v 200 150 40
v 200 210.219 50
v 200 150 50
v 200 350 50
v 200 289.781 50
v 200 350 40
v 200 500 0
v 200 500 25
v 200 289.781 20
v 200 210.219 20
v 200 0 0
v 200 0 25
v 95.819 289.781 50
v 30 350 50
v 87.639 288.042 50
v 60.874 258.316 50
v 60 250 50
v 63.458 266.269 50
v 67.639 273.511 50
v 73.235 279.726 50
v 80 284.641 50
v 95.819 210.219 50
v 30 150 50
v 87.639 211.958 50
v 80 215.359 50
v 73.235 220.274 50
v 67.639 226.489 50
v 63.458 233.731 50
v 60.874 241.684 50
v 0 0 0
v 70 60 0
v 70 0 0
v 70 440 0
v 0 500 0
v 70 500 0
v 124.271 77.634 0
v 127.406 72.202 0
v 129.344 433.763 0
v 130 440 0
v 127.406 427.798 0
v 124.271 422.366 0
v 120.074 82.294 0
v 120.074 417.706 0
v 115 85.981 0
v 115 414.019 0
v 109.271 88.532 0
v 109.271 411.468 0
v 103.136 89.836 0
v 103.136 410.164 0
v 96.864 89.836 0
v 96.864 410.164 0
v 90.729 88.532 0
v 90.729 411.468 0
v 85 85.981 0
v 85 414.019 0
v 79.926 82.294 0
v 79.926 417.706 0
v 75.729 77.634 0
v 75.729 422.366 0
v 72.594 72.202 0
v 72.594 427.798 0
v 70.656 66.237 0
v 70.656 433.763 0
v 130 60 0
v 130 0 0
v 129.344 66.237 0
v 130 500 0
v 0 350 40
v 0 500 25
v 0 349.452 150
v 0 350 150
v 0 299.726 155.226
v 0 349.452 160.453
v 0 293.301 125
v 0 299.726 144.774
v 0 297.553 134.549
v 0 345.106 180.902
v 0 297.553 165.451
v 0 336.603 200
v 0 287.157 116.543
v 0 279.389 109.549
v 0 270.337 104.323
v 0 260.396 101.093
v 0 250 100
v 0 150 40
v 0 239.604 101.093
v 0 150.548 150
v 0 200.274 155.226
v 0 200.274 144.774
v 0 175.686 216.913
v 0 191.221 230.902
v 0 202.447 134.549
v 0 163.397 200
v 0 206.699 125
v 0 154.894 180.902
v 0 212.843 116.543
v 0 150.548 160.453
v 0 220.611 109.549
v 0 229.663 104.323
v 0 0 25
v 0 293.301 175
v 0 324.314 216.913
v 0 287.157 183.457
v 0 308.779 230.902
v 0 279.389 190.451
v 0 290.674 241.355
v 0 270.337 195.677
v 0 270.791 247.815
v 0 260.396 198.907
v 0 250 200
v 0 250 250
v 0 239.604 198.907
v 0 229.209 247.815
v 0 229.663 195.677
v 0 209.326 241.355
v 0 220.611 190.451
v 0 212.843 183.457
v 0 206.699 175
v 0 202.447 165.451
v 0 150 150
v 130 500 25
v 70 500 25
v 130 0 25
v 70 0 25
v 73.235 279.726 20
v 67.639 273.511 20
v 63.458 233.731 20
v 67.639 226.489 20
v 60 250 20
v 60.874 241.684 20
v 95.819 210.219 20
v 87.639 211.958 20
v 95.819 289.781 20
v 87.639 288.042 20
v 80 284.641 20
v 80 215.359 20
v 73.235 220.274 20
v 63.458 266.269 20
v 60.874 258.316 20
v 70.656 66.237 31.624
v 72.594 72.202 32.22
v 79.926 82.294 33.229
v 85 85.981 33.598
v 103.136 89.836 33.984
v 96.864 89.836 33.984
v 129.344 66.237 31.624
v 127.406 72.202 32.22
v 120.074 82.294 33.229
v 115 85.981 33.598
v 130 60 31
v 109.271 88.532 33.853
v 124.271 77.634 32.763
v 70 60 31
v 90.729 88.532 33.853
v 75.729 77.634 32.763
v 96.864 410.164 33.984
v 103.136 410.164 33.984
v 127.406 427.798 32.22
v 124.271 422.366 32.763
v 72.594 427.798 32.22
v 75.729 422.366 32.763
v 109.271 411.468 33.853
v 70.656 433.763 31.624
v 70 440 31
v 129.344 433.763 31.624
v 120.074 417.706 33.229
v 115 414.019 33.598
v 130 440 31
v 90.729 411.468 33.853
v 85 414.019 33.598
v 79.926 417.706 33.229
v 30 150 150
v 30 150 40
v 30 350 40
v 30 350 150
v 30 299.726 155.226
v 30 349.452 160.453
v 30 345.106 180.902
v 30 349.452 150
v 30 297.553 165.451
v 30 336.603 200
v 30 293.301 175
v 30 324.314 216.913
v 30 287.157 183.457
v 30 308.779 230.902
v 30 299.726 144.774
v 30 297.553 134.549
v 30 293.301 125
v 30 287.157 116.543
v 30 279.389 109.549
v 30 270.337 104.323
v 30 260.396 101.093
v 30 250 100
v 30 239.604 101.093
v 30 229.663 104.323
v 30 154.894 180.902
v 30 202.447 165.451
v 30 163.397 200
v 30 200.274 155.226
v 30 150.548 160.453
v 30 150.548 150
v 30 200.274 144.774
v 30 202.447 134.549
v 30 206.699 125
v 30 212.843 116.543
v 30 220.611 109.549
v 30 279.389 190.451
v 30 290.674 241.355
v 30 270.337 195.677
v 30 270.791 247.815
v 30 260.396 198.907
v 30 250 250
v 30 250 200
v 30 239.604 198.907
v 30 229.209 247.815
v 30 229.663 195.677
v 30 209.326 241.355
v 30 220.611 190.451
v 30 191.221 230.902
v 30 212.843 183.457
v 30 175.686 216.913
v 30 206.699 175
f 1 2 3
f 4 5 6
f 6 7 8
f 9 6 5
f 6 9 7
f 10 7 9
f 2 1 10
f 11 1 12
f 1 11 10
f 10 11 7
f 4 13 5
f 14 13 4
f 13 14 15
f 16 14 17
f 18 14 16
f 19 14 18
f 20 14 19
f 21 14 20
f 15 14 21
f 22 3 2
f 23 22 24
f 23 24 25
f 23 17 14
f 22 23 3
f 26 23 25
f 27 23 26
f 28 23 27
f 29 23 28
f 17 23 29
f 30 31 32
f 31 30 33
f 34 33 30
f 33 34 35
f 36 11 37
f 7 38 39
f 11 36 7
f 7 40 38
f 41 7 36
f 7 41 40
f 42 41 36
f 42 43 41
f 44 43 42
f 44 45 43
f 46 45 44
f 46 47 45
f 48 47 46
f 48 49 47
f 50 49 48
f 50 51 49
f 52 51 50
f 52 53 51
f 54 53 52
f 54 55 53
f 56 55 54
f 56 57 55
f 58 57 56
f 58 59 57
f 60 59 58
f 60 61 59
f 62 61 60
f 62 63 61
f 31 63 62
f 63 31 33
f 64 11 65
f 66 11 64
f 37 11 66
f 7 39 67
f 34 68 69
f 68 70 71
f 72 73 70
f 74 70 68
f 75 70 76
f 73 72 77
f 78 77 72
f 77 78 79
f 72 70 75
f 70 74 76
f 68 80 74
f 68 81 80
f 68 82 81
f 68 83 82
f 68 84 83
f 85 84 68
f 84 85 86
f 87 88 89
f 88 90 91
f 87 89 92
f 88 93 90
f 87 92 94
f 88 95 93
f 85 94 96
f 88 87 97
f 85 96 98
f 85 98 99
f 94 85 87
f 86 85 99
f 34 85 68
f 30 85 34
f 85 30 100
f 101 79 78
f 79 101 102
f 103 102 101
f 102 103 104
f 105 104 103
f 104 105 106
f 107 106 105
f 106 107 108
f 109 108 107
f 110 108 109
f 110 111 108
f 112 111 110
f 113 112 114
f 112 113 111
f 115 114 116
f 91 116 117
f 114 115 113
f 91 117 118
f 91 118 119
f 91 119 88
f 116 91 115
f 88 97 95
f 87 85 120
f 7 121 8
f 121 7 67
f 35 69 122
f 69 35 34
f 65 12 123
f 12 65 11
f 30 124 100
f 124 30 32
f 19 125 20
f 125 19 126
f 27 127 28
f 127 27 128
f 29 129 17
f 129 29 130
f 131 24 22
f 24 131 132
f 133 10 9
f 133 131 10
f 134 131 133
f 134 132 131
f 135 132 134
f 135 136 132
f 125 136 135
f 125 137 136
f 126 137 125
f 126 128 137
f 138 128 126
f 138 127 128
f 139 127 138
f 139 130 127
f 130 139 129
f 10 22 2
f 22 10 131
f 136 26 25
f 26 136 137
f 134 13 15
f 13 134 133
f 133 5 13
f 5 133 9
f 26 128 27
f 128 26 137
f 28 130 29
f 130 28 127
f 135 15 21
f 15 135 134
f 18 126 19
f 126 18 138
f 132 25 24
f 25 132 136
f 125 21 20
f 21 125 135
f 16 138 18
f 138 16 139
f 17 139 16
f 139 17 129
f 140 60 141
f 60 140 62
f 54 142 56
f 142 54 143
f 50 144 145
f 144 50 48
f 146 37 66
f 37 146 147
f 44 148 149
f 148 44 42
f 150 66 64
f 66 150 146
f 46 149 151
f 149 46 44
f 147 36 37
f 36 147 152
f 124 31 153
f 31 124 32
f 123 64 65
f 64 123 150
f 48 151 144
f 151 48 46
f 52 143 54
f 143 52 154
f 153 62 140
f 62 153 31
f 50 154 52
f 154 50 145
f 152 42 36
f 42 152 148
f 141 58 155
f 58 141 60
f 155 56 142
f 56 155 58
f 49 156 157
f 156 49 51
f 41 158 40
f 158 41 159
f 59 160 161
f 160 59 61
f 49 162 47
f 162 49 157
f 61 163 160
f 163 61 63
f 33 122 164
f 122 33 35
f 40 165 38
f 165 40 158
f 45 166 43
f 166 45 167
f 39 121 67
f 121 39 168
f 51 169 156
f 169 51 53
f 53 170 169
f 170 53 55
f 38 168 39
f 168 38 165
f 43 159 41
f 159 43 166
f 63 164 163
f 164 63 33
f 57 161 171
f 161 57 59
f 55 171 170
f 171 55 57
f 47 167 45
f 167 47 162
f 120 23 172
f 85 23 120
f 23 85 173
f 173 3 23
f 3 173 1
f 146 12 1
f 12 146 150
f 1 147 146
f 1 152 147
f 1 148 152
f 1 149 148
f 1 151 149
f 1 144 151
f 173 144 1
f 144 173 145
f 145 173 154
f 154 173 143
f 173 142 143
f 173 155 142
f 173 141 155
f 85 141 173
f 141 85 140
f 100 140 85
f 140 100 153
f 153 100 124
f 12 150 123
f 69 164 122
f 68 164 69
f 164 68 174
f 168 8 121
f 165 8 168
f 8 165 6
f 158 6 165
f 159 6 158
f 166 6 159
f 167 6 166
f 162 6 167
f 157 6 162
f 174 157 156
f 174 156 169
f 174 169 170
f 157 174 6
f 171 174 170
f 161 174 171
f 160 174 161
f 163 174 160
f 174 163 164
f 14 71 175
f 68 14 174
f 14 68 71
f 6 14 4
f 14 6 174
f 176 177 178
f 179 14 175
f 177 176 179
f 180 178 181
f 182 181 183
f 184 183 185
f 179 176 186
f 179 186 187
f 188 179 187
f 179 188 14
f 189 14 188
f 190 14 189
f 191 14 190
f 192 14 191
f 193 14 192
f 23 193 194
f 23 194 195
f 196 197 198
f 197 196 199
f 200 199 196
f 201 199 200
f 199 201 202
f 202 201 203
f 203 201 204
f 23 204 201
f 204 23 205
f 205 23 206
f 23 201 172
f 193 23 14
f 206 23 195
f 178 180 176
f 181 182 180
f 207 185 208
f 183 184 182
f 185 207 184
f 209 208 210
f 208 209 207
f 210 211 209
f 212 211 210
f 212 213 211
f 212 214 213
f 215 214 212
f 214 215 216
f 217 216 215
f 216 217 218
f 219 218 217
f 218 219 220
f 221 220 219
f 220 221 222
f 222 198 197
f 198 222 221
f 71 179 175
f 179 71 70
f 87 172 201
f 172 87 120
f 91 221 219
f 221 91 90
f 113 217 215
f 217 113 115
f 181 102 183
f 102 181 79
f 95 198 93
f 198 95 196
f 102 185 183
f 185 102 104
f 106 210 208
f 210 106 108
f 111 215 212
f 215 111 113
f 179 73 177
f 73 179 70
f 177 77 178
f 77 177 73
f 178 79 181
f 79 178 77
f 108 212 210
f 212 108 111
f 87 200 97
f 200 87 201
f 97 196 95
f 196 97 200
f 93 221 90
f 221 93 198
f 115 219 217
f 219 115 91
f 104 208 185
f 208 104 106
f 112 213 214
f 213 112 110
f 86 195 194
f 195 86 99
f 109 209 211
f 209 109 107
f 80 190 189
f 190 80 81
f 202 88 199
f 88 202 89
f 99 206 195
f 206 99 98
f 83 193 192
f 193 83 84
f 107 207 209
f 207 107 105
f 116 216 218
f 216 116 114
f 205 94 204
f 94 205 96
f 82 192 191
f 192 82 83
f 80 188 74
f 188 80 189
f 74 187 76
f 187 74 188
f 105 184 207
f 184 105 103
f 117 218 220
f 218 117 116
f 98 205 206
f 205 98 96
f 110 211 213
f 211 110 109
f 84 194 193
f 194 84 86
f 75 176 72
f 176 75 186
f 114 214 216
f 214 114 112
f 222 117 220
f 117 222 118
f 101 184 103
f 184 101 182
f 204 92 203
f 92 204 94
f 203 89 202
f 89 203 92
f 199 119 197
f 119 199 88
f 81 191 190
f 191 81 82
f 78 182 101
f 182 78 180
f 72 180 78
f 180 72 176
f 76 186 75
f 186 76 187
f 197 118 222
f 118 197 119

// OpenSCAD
//The Variable bank ------------------------------------------------

//All of the Base Values--------------------------------------------
    //Cube Base vaules
    cubeBaseWidth = 200;
    cubeBaseLength = 500;
    cubeBaseDepth = 50;

    // Mirrored Cylinder Cut Holes
    MirroredCylinderRadius = 30;
    CylinderInnerLength = 60;
        //Mirrored Cylinder Cut Holes Translations
        MirroredCylinderX = 100;
        MirroredCylinderY = 60;
        betweenCutsHoleDistance = 380;
        
    //Center Cylinder Cut Hole
    CenterCylinderRadius = 40;
    CenterCylinderCutDepth = 30;
    CenterCylinderBetweenLength = 100;
        //Center Cylinder Cut Hole Translations
        CenterCylinderX = 100;
        CenterCylinderY = 250;
        CenterCylinderZ = 20;
        
    //Double cube Cut
    cubeCutLength = 150;
    cubeCutDepth = 10;
        //Double Cube Translations
        DDCubeZHigh= 40;
        DDCubeZLow = 25;
        
   
//The end of base Values ---------------------------------------------
    
  
// Values for the back Plate -----------------------------------------
    //Back Plate Cylinder Values
        BackPlateInnerDiameter = 100;
        BackPlateOuterRadius = 100;
        BackPlateDepth = 30;
        //Back Plate Cube Values
        BackPlateCubeWidth = 150;
        BackPlateCubeLength = 200;
            //Translations For the cylinder & Cube
            CubeTransY = 150;
            CylinderTransY = 250;
            CylinderTransZ = 150;

// The End of Values for the Back Plate ------------------------------



// The main parts -----------------------------------------------------

// The Base Mount -----------------------------------------------------

difference(){
    cube([cubeBaseWidth, cubeBaseLength, cubeBaseDepth ]); //Main Mount Cube
    
    hull(){ // Center Cylinder Cut
        translate([CenterCylinderX, CenterCylinderY, CenterCylinderZ])
        cylinder(CenterCylinderCutDepth , r = CenterCylinderRadius); 
        
        translate([CenterCylinderX + CenterCylinderBetweenLength, CenterCylinderY, CenterCylinderZ])
        cylinder(CenterCylinderCutDepth , r = CenterCylinderRadius);
    }
    
    hull(){ // The first mirror cut
        translate([MirroredCylinderX, 0, 0])
        cylinder(cubeBaseDepth, r = MirroredCylinderRadius);
       
        translate([MirroredCylinderX, MirroredCylinderY , 0])
        cylinder(cubeBaseDepth, r = MirroredCylinderRadius);
        };
        
     translate([0,betweenCutsHoleDistance + MirroredCylinderY, 0])
     hull(){ // The Mirrored Cut
         translate([MirroredCylinderX, MirroredCylinderY, 0])
         cylinder(cubeBaseDepth, r = MirroredCylinderRadius);
          
         translate([MirroredCylinderX,  0, 0])
         cylinder(cubeBaseDepth, r = MirroredCylinderRadius);
        }
     
   hull(){
     translate([0, 0, DDCubeZHigh])
     cube([BackPlateCubeLength, cubeCutLength, cubeCutDepth]);
     
     translate([0, -cubeCutLength, DDCubeZLow])
     cube([BackPlateCubeLength, cubeCutLength, cubeCutDepth]);
       }
   
   hull(){    
     translate([0, cubeBaseLength - cubeCutLength, DDCubeZHigh])
     cube([BackPlateCubeLength, cubeCutLength, cubeCutDepth]);
       
       translate([0, cubeBaseLength, DDCubeZLow])
     cube([BackPlateCubeLength, cubeCutLength, cubeCutDepth]);
   }
        
}
// The End of the Base Mount-------------------------------------------
difference(){
    union(){
        translate([0, CubeTransY, 0])
        cube([BackPlateDepth, BackPlateCubeLength, BackPlateCubeWidth]);
        
        rotate([0, 90, 0])
        translate([-CylinderTransZ, CylinderTransY, 0])
        cylinder(BackPlateDepth, r = BackPlateOuterRadius);
    }
    
    rotate([0, 90, 0])
    translate([-CylinderTransZ, CylinderTransY, 0])
    cylinder(BackPlateDepth, d = BackPlateInnerDiameter);
    
    }

// The Back Mount -----------------------------------------------------

// The End of the Back Mount ------------------------------------------

//The End of the Main Parts ------------------------------------------
